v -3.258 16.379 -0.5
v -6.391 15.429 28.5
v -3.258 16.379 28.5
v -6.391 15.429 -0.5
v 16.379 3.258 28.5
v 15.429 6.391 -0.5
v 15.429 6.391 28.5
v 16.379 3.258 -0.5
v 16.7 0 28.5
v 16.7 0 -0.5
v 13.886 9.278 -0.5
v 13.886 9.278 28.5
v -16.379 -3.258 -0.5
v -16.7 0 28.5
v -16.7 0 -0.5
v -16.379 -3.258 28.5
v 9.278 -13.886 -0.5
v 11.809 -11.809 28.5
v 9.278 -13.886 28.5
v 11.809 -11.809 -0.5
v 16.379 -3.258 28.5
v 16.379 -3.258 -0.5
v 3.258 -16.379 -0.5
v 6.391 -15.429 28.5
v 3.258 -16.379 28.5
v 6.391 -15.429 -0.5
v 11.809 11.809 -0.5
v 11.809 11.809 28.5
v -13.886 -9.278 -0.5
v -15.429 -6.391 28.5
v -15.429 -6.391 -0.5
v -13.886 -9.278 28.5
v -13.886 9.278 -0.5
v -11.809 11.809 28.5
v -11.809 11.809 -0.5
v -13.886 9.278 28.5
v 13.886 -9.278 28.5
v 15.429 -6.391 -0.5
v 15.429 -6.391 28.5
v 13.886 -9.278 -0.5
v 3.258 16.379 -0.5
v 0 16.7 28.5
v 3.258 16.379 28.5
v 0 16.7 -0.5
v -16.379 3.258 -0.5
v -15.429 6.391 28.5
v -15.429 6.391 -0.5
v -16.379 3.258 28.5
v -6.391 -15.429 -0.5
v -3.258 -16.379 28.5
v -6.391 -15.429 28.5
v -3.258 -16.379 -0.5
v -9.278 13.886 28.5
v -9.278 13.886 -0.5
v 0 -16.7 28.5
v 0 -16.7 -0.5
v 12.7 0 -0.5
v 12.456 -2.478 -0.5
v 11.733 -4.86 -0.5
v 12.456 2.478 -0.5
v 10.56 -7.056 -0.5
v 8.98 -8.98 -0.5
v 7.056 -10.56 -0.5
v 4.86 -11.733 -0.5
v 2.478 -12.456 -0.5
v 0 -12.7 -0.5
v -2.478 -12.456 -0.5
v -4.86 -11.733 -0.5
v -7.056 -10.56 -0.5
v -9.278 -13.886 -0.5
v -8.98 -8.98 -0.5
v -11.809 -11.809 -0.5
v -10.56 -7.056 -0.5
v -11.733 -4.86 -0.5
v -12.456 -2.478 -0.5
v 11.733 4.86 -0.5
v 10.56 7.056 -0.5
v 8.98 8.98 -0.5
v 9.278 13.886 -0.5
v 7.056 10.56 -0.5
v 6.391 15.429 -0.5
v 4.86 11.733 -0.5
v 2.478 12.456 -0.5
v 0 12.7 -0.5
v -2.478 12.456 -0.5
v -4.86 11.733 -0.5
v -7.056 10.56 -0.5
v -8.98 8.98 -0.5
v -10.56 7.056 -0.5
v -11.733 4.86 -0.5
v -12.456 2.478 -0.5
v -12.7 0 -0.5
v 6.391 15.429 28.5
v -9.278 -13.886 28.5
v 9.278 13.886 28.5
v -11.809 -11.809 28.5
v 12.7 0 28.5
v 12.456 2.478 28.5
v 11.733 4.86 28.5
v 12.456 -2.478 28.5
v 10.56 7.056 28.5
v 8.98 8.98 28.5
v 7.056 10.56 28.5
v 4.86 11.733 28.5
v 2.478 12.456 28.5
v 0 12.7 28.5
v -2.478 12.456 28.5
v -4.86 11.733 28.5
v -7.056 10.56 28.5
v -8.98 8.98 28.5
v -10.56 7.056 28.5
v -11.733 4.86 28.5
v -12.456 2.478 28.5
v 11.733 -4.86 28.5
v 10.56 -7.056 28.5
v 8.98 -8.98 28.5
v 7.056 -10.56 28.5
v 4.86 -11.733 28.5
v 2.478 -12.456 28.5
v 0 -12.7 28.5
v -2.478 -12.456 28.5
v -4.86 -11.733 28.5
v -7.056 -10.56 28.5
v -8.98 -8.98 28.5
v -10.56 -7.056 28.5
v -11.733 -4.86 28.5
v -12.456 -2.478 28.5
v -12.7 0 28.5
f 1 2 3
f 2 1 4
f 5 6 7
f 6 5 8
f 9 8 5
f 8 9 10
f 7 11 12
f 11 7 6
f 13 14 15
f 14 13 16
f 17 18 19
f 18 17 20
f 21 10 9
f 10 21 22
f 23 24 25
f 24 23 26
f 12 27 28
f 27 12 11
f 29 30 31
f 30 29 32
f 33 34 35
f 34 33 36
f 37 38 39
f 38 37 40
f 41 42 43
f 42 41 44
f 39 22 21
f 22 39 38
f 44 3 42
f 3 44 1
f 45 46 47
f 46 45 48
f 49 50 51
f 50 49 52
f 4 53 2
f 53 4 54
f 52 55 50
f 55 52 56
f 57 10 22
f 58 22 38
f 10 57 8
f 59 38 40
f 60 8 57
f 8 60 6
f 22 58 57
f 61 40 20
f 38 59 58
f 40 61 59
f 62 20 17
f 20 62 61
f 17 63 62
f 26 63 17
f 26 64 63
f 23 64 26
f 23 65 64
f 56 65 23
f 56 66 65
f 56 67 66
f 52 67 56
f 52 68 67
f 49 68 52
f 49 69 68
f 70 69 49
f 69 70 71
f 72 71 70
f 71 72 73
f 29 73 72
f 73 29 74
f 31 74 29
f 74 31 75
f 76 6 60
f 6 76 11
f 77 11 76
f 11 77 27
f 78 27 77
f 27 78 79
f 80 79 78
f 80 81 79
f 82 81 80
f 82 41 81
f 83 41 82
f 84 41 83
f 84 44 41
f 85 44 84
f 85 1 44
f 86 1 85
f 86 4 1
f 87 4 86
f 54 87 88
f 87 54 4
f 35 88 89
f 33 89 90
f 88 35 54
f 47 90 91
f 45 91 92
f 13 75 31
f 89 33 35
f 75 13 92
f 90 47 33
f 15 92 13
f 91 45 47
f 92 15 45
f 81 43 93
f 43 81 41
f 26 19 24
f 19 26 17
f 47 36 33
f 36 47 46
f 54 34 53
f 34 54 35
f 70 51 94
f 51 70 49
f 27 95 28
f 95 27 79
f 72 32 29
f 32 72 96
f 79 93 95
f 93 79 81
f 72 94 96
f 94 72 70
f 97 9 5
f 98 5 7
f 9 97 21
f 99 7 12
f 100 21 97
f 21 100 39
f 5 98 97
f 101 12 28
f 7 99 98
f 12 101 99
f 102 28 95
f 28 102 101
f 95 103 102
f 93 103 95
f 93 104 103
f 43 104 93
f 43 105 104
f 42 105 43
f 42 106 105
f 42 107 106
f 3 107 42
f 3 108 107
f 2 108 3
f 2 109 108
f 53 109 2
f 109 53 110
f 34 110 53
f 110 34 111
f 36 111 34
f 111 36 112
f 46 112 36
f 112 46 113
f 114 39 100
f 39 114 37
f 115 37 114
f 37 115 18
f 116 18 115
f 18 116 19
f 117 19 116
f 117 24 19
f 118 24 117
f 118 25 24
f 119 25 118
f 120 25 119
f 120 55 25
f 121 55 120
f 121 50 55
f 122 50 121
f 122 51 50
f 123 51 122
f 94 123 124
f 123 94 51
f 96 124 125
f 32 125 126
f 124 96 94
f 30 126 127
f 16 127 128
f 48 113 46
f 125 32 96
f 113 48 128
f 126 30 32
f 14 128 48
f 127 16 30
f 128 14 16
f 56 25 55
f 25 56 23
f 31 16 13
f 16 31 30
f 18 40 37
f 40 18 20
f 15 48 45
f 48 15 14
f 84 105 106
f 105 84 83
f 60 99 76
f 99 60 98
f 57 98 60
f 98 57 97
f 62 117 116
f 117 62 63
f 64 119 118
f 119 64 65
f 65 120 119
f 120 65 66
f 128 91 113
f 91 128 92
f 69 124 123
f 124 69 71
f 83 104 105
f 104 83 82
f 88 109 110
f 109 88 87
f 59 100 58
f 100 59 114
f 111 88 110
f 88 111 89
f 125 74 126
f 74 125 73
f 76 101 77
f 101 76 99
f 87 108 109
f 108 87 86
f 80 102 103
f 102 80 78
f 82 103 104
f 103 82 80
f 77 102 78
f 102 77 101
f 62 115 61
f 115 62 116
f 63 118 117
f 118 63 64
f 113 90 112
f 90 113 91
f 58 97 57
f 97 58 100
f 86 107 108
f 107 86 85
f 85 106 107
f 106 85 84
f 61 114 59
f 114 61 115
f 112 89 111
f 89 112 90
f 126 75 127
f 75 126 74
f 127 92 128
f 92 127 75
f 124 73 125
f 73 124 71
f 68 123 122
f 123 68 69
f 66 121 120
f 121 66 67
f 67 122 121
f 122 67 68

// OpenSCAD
$fn = 32;

// ----------------------------------------------------------------------
// Two-module gear rim: z14 m2 and z14 m2, 28 mm wide
// ----------------------------------------------------------------------

// --- parameters (mm) ---
module_a = 2;             // first tooth module
teeth_a = 14;             // first band tooth count
module_b = 2;             // second tooth module
teeth_b = 14;             // second band tooth count
band_h = 12;              // height of one tooth band
web_t = 4;                // web thickness between the bands
total = 28;               // overall width over both bands
root_r = 11.5;            // root radius of the coarse band
hub_r = 16.7;             // hub radius
bore_d = 25.4;            // hub bore
hole_count = 5;           // lightening holes
hole_r = 8.75;            // lightening hole circle radius
hole_d = 4;               // lightening hole diameter

band_a = [[11.408, -1.455], [14.054, -1.531], [15.023, -1.173], [15.987, -0.646], [15.987, 0.646], [15.023, 1.173], [14.054, 1.531], [11.408, 1.455], [10.909, 3.638], [13.326, 4.718], [14.044, 5.461], [14.684, 6.355], [14.124, 7.518], [13.026, 7.575], [11.998, 7.477], [9.646, 6.261], [8.25, 8.011], [9.959, 10.033], [10.284, 11.014], [10.473, 12.096], [9.463, 12.902], [8.449, 12.477], [7.566, 11.942], [5.975, 9.826], [3.957, 10.798], [4.62, 13.361], [4.487, 14.385], [4.187, 15.442], [2.928, 15.73], [2.199, 14.907], [1.635, 14.042], [1.12, 11.445], [-1.12, 11.445], [-1.635, 14.042], [-2.199, 14.907], [-2.928, 15.73], [-4.187, 15.442], [-4.487, 14.385], [-4.62, 13.361], [-3.957, 10.798], [-5.975, 9.826], [-7.566, 11.942], [-8.449, 12.477], [-9.463, 12.902], [-10.473, 12.096], [-10.284, 11.014], [-9.959, 10.033], [-8.25, 8.011], [-9.646, 6.261], [-11.998, 7.477], [-13.026, 7.575], [-14.124, 7.518], [-14.684, 6.355], [-14.044, 5.461], [-13.326, 4.718], [-10.909, 3.638], [-11.408, 1.455], [-14.054, 1.531], [-15.023, 1.173], [-15.987, 0.646], [-15.987, -0.646], [-15.023, -1.173], [-14.054, -1.531], [-11.408, -1.455], [-10.909, -3.638], [-13.326, -4.718], [-14.044, -5.461], [-14.684, -6.355], [-14.124, -7.518], [-13.026, -7.575], [-11.998, -7.477], [-9.646, -6.261], [-8.25, -8.011], [-9.959, -10.033], [-10.284, -11.014], [-10.473, -12.096], [-9.463, -12.902], [-8.449, -12.477], [-7.566, -11.942], [-5.975, -9.826], [-3.957, -10.798], [-4.62, -13.361], [-4.487, -14.385], [-4.187, -15.442], [-2.928, -15.73], [-2.199, -14.907], [-1.635, -14.042], [-1.12, -11.445], [1.12, -11.445], [1.635, -14.042], [2.199, -14.907], [2.928, -15.73], [4.187, -15.442], [4.487, -14.385], [4.62, -13.361], [3.957, -10.798], [5.975, -9.826], [7.566, -11.942], [8.449, -12.477], [9.463, -12.902], [10.473, -12.096], [10.284, -11.014], [9.959, -10.033], [8.25, -8.011], [9.646, -6.261], [11.998, -7.477], [13.026, -7.575], [14.124, -7.518], [14.684, -6.355], [14.044, -5.461], [13.326, -4.718], [10.909, -3.638]];
band_b = [[11.408, -1.455], [14.054, -1.531], [15.023, -1.173], [15.987, -0.646], [15.987, 0.646], [15.023, 1.173], [14.054, 1.531], [11.408, 1.455], [10.909, 3.638], [13.326, 4.718], [14.044, 5.461], [14.684, 6.355], [14.124, 7.518], [13.026, 7.575], [11.998, 7.477], [9.646, 6.261], [8.25, 8.011], [9.959, 10.033], [10.284, 11.014], [10.473, 12.096], [9.463, 12.902], [8.449, 12.477], [7.566, 11.942], [5.975, 9.826], [3.957, 10.798], [4.62, 13.361], [4.487, 14.385], [4.187, 15.442], [2.928, 15.73], [2.199, 14.907], [1.635, 14.042], [1.12, 11.445], [-1.12, 11.445], [-1.635, 14.042], [-2.199, 14.907], [-2.928, 15.73], [-4.187, 15.442], [-4.487, 14.385], [-4.62, 13.361], [-3.957, 10.798], [-5.975, 9.826], [-7.566, 11.942], [-8.449, 12.477], [-9.463, 12.902], [-10.473, 12.096], [-10.284, 11.014], [-9.959, 10.033], [-8.25, 8.011], [-9.646, 6.261], [-11.998, 7.477], [-13.026, 7.575], [-14.124, 7.518], [-14.684, 6.355], [-14.044, 5.461], [-13.326, 4.718], [-10.909, 3.638], [-11.408, 1.455], [-14.054, 1.531], [-15.023, 1.173], [-15.987, 0.646], [-15.987, -0.646], [-15.023, -1.173], [-14.054, -1.531], [-11.408, -1.455], [-10.909, -3.638], [-13.326, -4.718], [-14.044, -5.461], [-14.684, -6.355], [-14.124, -7.518], [-13.026, -7.575], [-11.998, -7.477], [-9.646, -6.261], [-8.25, -8.011], [-9.959, -10.033], [-10.284, -11.014], [-10.473, -12.096], [-9.463, -12.902], [-8.449, -12.477], [-7.566, -11.942], [-5.975, -9.826], [-3.957, -10.798], [-4.62, -13.361], [-4.487, -14.385], [-4.187, -15.442], [-2.928, -15.73], [-2.199, -14.907], [-1.635, -14.042], [-1.12, -11.445], [1.12, -11.445], [1.635, -14.042], [2.199, -14.907], [2.928, -15.73], [4.187, -15.442], [4.487, -14.385], [4.62, -13.361], [3.957, -10.798], [5.975, -9.826], [7.566, -11.942], [8.449, -12.477], [9.463, -12.902], [10.473, -12.096], [10.284, -11.014], [9.959, -10.033], [8.25, -8.011], [9.646, -6.261], [11.998, -7.477], [13.026, -7.575], [14.124, -7.518], [14.684, -6.355], [14.044, -5.461], [13.326, -4.718], [10.909, -3.638]];

difference() {
  union() {
    /* tooth band A, overlapping the web by 0.4 mm */
    linear_extrude(height = band_h + 0.4) polygon(band_a);
    /* web */
    translate([0, 0, band_h - 0.4]) cylinder(h = web_t + 0.8, d = 2 * root_r);
    /* tooth band B */
    translate([0, 0, band_h + web_t]) linear_extrude(height = band_h + 0.4) polygon(band_b);
    /* hub */
    translate([0, 0, -0.5]) cylinder(h = total + 1.0, d = 2 * hub_r);
  }
  /* bore */
  translate([0, 0, -2.5]) cylinder(h = total + 5, d = bore_d);
  /* lightening holes through the web */
  for (i = [0 : hole_count - 1]) {
    a = i * 360 / hole_count;
    translate([hole_r * cos(a), hole_r * sin(a), -2.5]) cylinder(h = total + 5, d = hole_d);
  }
}
